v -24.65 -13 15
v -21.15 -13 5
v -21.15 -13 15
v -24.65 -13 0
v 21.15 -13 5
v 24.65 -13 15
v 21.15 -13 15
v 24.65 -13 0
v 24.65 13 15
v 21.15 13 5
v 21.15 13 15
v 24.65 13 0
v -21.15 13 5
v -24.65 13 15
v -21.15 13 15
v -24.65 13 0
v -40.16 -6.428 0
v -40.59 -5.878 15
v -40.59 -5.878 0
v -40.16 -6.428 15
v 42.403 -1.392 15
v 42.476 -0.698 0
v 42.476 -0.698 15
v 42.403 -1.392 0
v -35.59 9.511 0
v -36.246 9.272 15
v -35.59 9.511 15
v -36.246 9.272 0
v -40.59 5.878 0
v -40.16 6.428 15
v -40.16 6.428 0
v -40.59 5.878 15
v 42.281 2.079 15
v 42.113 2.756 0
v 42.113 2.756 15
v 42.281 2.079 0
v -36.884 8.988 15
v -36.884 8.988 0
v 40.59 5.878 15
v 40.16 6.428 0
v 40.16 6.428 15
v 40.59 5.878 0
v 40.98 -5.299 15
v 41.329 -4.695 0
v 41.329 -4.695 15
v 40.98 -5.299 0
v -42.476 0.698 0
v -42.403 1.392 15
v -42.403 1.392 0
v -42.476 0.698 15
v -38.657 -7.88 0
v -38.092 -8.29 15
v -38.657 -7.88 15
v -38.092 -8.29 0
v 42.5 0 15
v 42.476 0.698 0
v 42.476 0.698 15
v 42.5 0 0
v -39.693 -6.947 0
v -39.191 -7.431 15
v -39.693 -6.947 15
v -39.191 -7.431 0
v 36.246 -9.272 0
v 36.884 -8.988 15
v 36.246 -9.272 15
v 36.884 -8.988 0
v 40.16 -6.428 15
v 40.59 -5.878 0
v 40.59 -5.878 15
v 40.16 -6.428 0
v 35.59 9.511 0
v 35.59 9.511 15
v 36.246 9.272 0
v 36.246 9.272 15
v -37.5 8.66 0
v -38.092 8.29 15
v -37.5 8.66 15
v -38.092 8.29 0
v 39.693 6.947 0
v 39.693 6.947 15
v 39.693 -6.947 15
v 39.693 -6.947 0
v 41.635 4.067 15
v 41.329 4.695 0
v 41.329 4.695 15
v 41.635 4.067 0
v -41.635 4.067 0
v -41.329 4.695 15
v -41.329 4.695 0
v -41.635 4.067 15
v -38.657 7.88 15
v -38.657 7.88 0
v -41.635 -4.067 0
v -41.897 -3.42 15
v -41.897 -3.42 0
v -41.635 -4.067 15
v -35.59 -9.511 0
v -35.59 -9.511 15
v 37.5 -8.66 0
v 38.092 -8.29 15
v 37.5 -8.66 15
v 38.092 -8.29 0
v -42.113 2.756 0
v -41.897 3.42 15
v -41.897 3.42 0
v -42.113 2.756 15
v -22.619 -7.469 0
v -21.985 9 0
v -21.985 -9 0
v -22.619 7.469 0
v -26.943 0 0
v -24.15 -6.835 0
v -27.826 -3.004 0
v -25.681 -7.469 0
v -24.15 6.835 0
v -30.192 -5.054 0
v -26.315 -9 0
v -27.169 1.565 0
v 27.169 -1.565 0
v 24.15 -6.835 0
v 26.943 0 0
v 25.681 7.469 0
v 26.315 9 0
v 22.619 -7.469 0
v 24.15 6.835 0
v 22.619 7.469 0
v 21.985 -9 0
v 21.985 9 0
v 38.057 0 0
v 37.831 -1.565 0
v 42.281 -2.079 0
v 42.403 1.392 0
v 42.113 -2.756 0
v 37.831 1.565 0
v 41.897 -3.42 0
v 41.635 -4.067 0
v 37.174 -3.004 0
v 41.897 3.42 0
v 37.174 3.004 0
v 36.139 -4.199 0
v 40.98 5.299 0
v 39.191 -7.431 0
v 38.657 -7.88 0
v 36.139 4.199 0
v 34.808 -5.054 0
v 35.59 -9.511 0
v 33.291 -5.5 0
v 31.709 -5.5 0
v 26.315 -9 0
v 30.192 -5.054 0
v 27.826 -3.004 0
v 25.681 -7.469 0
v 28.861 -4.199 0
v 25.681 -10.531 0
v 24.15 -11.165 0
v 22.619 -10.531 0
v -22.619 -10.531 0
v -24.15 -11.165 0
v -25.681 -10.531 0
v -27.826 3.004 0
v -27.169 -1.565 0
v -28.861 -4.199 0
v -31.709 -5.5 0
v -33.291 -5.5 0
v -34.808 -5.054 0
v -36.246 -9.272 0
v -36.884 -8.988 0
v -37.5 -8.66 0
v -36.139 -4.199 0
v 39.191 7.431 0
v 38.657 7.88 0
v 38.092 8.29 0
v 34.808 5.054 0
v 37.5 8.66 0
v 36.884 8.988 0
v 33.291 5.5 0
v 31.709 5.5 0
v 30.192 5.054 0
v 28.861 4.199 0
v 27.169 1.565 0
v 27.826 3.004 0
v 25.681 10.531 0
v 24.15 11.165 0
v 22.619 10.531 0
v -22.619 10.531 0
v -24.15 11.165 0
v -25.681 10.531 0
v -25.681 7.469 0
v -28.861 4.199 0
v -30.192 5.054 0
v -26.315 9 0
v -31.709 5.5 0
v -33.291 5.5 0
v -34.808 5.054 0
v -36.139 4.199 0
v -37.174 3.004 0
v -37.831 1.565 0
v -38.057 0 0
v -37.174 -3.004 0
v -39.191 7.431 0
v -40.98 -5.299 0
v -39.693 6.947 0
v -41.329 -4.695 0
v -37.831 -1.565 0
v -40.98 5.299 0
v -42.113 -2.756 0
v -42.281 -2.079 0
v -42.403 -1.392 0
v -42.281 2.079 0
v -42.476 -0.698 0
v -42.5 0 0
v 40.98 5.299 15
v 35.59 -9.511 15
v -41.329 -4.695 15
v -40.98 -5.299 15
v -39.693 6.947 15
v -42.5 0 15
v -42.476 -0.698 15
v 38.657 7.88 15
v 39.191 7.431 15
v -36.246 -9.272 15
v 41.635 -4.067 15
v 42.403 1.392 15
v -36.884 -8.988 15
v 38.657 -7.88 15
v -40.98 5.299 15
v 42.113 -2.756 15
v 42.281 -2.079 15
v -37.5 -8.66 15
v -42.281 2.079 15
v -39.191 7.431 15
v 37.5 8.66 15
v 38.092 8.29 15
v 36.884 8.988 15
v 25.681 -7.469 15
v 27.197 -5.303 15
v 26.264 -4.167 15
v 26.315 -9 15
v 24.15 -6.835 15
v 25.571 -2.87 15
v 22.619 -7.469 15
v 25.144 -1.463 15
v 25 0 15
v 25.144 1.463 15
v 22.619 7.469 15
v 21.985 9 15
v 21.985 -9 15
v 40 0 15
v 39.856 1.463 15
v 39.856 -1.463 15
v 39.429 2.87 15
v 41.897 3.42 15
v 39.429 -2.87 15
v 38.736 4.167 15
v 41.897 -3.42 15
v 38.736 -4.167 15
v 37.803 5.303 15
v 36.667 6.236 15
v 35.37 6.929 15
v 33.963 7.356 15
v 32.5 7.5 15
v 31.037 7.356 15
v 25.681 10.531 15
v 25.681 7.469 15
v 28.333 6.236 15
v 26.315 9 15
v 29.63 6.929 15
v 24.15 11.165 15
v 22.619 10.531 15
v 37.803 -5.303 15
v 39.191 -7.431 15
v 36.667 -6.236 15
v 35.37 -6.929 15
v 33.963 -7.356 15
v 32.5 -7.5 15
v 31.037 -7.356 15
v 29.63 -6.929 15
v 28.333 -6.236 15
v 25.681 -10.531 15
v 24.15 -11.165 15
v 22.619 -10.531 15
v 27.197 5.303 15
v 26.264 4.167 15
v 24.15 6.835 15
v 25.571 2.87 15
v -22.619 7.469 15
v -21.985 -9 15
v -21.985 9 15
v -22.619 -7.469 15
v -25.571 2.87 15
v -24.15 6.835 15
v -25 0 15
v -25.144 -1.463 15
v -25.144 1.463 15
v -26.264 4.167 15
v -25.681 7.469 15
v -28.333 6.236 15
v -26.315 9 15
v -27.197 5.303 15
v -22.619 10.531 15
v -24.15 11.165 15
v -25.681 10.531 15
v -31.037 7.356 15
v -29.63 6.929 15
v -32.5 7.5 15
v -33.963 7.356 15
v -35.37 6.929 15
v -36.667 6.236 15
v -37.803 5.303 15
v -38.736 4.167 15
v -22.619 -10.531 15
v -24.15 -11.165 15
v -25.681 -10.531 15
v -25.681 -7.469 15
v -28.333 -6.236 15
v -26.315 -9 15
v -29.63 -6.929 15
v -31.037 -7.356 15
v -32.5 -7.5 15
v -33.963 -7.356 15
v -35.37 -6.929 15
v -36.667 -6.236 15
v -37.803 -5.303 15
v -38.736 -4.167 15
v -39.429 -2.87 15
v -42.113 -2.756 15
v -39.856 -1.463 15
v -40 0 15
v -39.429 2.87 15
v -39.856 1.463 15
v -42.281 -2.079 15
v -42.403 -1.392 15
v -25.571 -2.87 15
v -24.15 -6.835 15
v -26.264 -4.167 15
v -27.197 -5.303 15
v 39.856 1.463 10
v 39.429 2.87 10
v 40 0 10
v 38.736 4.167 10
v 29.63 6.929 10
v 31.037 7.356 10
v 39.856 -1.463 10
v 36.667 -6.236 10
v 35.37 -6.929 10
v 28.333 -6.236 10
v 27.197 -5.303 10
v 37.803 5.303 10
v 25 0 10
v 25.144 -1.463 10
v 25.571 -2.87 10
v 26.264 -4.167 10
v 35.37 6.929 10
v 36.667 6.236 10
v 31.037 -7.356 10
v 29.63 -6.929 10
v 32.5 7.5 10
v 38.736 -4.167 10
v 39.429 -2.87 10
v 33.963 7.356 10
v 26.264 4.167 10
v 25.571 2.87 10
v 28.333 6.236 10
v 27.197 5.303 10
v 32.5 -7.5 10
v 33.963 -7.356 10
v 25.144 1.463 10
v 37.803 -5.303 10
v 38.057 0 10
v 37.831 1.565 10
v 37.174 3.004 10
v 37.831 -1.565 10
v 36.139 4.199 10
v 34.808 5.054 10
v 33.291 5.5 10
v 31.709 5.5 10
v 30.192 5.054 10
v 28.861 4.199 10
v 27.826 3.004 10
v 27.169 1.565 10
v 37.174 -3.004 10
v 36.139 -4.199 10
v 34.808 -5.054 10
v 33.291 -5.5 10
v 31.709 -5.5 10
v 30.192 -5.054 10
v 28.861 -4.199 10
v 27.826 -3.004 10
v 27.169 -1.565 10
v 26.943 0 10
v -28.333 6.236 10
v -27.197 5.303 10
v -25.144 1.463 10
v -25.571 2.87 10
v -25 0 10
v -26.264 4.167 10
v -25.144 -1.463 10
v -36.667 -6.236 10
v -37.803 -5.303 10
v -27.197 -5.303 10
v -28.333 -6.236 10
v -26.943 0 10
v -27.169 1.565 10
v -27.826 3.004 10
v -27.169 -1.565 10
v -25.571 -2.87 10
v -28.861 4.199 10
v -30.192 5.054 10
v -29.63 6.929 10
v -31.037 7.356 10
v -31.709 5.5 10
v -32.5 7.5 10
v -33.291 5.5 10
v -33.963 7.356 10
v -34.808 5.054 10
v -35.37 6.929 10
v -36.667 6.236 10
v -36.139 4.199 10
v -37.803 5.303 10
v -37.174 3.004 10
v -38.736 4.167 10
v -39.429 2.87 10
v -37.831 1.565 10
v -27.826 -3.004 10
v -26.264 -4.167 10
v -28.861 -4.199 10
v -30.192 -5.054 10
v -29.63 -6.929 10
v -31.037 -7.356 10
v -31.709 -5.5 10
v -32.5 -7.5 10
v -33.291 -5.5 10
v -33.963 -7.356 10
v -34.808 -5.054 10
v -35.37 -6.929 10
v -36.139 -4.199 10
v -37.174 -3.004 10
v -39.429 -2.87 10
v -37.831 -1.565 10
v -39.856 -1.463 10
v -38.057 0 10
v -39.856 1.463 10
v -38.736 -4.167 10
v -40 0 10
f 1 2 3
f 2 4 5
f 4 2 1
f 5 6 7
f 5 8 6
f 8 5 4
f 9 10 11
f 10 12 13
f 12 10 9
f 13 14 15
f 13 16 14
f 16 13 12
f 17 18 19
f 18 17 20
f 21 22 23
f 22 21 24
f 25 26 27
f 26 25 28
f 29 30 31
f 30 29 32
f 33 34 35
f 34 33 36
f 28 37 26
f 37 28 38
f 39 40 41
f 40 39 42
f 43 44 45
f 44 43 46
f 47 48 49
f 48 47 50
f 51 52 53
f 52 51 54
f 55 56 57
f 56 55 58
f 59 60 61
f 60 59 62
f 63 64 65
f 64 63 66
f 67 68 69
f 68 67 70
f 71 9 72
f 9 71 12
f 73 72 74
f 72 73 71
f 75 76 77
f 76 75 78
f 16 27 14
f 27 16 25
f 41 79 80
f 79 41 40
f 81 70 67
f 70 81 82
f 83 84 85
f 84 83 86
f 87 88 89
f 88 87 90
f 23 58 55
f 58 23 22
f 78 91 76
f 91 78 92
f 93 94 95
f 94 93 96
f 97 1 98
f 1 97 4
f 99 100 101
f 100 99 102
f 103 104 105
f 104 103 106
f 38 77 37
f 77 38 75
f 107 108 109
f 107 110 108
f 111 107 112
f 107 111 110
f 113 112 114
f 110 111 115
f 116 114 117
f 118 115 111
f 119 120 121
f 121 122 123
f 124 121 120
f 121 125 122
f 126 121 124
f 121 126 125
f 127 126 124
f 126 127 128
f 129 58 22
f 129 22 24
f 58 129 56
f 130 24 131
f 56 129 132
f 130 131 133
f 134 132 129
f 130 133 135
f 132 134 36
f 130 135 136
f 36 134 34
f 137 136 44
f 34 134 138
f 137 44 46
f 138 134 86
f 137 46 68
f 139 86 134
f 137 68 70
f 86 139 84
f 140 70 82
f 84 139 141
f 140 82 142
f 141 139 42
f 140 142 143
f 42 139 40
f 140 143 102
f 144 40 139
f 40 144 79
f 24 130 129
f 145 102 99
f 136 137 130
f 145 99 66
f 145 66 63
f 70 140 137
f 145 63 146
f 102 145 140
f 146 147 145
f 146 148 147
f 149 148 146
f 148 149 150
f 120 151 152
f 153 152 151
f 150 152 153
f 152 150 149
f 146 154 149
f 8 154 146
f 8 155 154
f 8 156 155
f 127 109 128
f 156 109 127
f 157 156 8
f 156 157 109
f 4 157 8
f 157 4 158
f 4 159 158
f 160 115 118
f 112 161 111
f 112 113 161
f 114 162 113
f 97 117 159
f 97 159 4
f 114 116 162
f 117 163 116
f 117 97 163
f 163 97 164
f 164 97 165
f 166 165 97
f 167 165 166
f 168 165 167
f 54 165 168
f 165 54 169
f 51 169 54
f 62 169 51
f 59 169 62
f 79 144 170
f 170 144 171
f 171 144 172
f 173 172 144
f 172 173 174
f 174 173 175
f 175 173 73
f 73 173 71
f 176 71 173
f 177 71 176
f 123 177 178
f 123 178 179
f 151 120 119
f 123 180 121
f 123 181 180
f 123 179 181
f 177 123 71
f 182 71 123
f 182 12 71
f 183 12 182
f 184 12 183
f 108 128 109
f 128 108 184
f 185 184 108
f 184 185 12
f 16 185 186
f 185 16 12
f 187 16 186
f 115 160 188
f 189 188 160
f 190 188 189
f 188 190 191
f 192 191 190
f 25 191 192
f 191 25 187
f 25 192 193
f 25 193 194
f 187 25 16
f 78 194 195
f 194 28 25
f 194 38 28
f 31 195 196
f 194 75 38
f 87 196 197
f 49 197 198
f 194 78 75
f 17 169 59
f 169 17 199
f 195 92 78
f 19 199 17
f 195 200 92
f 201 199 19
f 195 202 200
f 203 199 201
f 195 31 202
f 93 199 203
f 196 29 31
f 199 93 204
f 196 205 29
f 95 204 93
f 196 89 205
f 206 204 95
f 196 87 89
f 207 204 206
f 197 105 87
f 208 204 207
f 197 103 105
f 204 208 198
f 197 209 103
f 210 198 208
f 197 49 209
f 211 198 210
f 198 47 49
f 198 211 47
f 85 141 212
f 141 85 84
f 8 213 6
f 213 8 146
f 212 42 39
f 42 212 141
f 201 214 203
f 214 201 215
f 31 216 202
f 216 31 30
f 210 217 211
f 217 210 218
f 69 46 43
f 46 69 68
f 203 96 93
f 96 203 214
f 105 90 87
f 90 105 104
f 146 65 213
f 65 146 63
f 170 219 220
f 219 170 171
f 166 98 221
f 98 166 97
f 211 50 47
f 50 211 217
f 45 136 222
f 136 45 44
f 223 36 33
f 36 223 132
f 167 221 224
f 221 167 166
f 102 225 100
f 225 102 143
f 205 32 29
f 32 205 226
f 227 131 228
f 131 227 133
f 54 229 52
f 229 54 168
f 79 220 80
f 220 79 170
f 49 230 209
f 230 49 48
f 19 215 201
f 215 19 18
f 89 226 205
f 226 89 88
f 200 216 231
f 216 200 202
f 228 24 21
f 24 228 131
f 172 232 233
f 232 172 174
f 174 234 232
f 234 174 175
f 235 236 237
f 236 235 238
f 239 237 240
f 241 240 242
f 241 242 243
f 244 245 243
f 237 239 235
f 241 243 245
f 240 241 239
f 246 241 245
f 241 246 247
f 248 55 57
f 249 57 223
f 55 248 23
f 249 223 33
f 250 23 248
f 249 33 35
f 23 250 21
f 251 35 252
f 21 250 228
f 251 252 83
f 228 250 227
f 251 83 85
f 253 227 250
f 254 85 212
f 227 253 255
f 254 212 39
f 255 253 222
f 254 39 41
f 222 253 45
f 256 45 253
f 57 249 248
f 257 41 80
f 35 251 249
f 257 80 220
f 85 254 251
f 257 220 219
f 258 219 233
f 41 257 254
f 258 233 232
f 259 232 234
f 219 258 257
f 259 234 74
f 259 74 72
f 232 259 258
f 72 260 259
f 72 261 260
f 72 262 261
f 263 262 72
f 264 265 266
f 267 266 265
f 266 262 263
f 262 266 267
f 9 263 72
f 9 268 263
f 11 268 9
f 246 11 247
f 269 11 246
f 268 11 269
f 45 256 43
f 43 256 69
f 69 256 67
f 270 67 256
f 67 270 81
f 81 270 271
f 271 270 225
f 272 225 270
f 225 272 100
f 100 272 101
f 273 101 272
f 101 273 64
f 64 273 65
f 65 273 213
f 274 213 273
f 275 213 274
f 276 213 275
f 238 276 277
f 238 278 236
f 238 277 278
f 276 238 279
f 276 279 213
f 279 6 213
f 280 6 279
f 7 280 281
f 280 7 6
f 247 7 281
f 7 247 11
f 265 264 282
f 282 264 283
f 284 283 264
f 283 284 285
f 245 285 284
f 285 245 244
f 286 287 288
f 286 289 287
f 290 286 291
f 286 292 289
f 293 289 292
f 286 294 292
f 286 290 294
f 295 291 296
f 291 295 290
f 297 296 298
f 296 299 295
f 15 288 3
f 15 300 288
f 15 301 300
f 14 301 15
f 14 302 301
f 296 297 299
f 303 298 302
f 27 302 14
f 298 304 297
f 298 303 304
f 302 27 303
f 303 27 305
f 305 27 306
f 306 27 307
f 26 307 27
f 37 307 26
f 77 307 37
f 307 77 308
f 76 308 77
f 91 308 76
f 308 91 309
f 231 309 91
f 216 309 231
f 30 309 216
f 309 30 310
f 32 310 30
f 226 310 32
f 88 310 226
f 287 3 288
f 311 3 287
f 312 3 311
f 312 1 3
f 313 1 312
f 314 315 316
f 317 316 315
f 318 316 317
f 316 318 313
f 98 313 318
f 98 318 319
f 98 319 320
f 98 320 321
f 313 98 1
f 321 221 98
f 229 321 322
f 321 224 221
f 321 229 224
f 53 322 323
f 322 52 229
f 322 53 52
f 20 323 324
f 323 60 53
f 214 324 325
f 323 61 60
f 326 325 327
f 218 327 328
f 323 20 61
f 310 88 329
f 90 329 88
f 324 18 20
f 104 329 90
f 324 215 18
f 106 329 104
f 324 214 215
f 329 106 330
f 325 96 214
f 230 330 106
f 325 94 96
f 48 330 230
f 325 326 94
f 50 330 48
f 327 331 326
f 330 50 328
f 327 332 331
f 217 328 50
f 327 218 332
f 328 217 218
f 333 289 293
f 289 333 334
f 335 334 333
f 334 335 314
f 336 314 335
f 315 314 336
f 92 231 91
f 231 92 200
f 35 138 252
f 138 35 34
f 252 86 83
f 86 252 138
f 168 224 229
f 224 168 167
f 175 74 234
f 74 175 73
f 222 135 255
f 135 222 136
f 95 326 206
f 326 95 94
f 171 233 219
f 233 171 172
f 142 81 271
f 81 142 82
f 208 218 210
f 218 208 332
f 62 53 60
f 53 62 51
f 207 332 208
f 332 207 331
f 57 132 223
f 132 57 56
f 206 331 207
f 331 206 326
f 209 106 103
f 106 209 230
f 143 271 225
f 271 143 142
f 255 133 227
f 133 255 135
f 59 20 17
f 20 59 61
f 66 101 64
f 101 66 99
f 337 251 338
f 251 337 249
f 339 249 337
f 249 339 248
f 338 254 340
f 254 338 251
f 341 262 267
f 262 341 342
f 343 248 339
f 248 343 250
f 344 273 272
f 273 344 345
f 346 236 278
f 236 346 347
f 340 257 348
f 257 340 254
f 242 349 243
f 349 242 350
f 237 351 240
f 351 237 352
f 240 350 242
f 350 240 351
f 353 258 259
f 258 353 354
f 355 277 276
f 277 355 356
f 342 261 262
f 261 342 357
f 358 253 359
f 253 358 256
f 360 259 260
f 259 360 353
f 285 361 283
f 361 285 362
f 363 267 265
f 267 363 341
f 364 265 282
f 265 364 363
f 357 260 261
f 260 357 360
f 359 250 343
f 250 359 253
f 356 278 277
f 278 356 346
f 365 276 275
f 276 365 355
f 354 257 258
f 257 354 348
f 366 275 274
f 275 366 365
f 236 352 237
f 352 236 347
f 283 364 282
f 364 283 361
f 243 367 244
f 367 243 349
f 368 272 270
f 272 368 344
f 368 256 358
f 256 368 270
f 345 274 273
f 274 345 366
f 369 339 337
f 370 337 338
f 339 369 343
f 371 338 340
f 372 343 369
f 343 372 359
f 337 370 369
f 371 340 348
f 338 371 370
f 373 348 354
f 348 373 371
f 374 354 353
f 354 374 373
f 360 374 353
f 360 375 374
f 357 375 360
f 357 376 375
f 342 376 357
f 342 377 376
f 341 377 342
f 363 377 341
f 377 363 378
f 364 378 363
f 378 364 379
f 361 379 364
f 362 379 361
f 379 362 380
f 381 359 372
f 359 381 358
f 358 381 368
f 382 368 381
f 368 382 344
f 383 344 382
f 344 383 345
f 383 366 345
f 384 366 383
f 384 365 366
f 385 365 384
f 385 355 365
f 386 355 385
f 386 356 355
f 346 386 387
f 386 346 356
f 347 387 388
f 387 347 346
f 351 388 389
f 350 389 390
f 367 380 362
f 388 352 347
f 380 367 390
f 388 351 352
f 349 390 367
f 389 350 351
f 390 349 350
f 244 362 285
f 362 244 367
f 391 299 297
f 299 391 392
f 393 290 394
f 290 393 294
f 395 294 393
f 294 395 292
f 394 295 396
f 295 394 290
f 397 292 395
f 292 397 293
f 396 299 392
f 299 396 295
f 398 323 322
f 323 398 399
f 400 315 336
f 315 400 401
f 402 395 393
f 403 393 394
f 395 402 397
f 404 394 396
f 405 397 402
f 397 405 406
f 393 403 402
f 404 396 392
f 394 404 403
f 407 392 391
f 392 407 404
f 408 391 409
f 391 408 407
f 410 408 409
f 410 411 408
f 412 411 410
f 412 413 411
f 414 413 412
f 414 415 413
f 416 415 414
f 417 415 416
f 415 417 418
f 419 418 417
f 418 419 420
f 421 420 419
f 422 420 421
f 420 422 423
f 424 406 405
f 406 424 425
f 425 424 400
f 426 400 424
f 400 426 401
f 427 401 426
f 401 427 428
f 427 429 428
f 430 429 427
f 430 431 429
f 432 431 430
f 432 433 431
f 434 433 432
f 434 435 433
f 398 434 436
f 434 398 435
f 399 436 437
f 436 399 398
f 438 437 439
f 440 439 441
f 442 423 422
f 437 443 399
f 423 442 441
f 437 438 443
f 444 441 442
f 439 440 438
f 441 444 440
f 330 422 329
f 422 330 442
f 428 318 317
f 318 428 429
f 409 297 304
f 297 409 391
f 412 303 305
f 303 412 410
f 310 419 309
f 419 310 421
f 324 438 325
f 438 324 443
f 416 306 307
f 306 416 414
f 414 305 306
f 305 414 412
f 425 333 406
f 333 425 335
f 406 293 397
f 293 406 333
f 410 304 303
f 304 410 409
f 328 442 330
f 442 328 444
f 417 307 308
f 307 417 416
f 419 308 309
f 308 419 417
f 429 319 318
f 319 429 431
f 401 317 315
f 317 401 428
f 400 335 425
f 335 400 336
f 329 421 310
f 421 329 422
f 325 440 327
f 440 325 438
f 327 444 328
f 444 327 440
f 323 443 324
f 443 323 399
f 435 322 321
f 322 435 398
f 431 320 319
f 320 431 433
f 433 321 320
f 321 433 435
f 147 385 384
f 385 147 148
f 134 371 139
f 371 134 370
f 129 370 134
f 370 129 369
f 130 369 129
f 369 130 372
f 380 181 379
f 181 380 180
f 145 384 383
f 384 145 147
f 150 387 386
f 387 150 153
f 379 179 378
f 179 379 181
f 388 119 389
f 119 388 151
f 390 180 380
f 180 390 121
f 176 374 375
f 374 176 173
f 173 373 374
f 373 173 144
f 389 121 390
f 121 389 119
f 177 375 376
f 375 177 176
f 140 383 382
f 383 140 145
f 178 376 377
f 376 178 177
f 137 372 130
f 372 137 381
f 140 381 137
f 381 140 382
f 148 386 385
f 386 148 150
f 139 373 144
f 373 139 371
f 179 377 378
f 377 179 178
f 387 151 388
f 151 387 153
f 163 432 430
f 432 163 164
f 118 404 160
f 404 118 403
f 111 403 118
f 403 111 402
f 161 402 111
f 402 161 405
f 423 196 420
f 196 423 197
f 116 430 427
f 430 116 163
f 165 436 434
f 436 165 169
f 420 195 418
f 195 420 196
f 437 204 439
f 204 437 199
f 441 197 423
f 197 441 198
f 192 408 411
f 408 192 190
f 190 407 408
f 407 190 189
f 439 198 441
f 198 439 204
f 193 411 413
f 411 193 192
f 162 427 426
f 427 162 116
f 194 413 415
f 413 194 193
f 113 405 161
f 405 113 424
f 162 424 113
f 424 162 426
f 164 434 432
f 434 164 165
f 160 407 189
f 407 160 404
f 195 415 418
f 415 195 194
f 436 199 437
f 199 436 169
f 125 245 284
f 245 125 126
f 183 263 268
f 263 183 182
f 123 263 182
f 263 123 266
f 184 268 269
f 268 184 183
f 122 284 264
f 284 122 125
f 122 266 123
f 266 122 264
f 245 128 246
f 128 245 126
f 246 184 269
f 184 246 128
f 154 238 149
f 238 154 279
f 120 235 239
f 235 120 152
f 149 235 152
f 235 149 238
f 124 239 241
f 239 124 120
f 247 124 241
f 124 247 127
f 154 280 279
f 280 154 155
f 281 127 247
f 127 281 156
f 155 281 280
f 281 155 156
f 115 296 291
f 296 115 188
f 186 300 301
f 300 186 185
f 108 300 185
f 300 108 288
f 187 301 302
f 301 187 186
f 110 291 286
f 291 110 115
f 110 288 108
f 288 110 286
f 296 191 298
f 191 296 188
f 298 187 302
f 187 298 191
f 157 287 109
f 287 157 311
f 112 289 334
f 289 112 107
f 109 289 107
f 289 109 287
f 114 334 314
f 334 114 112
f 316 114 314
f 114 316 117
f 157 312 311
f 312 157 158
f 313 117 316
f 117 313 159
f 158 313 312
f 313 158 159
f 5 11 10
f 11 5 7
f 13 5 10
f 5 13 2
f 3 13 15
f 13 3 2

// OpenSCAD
// file: polyhole.scad
// The Cylinder is dead! Long live the Cylinder!
// A module for a polyhole by radius, based on Nophead's work.

module polyhole(h, r, cent = false)
{
    n = max(round(4 * r), 3);
    cylinder(h = h, r = r / cos(180 / n), $fn = n, center = cent);
}
// main file
use<polyhole.scad>

CarriageEnd();

module CarriageEnd()
{
    difference()
    {
        union()
        {
            hull()
            {
                translate([65/2, 0, 0])
                    cylinder(h = 5+5+5, r = (15+5)/2, $fn = 90);
                translate([-65/2, 0, 0])
                    cylinder(h = 5+5+5, r = (15+5)/2, $fn = 90);
                translate([0, 0, (5+5+5)/2])
                    cube([42.3+4+3, 20+6, 5+5+5], center = true);
            }
        }
        translate([65/2, 0, 5+5])
            cylinder(h = 5+5, r = 15/2, $fn = 32);
        translate([-65/2, 0, 5+5])
            cylinder(h = 5+5, r = 15/2, $fn = 32);
        translate([65/2, 0, 0])
            polyhole(5+5+5, 5.5);
        translate([-65/2, 0, 0])
            polyhole(5+5+5, 5.5);
        translate([42.3/2+3, 9, 0])
            polyhole(5+5+5, 2);
        translate([42.3/2+3, -9, 0])
            polyhole(5+5+5, 2);
        translate([-42.3/2-3, 9, 0])
            polyhole(5+5+5, 2);
        translate([-42.3/2-3, -9, 0])
            polyhole(5+5+5, 2);
        translate([0, 42.3/2-13, 5+(25+2+28)/2])
            cube([42.3, 42.3, 25+2+28], center = true);
    }
}
